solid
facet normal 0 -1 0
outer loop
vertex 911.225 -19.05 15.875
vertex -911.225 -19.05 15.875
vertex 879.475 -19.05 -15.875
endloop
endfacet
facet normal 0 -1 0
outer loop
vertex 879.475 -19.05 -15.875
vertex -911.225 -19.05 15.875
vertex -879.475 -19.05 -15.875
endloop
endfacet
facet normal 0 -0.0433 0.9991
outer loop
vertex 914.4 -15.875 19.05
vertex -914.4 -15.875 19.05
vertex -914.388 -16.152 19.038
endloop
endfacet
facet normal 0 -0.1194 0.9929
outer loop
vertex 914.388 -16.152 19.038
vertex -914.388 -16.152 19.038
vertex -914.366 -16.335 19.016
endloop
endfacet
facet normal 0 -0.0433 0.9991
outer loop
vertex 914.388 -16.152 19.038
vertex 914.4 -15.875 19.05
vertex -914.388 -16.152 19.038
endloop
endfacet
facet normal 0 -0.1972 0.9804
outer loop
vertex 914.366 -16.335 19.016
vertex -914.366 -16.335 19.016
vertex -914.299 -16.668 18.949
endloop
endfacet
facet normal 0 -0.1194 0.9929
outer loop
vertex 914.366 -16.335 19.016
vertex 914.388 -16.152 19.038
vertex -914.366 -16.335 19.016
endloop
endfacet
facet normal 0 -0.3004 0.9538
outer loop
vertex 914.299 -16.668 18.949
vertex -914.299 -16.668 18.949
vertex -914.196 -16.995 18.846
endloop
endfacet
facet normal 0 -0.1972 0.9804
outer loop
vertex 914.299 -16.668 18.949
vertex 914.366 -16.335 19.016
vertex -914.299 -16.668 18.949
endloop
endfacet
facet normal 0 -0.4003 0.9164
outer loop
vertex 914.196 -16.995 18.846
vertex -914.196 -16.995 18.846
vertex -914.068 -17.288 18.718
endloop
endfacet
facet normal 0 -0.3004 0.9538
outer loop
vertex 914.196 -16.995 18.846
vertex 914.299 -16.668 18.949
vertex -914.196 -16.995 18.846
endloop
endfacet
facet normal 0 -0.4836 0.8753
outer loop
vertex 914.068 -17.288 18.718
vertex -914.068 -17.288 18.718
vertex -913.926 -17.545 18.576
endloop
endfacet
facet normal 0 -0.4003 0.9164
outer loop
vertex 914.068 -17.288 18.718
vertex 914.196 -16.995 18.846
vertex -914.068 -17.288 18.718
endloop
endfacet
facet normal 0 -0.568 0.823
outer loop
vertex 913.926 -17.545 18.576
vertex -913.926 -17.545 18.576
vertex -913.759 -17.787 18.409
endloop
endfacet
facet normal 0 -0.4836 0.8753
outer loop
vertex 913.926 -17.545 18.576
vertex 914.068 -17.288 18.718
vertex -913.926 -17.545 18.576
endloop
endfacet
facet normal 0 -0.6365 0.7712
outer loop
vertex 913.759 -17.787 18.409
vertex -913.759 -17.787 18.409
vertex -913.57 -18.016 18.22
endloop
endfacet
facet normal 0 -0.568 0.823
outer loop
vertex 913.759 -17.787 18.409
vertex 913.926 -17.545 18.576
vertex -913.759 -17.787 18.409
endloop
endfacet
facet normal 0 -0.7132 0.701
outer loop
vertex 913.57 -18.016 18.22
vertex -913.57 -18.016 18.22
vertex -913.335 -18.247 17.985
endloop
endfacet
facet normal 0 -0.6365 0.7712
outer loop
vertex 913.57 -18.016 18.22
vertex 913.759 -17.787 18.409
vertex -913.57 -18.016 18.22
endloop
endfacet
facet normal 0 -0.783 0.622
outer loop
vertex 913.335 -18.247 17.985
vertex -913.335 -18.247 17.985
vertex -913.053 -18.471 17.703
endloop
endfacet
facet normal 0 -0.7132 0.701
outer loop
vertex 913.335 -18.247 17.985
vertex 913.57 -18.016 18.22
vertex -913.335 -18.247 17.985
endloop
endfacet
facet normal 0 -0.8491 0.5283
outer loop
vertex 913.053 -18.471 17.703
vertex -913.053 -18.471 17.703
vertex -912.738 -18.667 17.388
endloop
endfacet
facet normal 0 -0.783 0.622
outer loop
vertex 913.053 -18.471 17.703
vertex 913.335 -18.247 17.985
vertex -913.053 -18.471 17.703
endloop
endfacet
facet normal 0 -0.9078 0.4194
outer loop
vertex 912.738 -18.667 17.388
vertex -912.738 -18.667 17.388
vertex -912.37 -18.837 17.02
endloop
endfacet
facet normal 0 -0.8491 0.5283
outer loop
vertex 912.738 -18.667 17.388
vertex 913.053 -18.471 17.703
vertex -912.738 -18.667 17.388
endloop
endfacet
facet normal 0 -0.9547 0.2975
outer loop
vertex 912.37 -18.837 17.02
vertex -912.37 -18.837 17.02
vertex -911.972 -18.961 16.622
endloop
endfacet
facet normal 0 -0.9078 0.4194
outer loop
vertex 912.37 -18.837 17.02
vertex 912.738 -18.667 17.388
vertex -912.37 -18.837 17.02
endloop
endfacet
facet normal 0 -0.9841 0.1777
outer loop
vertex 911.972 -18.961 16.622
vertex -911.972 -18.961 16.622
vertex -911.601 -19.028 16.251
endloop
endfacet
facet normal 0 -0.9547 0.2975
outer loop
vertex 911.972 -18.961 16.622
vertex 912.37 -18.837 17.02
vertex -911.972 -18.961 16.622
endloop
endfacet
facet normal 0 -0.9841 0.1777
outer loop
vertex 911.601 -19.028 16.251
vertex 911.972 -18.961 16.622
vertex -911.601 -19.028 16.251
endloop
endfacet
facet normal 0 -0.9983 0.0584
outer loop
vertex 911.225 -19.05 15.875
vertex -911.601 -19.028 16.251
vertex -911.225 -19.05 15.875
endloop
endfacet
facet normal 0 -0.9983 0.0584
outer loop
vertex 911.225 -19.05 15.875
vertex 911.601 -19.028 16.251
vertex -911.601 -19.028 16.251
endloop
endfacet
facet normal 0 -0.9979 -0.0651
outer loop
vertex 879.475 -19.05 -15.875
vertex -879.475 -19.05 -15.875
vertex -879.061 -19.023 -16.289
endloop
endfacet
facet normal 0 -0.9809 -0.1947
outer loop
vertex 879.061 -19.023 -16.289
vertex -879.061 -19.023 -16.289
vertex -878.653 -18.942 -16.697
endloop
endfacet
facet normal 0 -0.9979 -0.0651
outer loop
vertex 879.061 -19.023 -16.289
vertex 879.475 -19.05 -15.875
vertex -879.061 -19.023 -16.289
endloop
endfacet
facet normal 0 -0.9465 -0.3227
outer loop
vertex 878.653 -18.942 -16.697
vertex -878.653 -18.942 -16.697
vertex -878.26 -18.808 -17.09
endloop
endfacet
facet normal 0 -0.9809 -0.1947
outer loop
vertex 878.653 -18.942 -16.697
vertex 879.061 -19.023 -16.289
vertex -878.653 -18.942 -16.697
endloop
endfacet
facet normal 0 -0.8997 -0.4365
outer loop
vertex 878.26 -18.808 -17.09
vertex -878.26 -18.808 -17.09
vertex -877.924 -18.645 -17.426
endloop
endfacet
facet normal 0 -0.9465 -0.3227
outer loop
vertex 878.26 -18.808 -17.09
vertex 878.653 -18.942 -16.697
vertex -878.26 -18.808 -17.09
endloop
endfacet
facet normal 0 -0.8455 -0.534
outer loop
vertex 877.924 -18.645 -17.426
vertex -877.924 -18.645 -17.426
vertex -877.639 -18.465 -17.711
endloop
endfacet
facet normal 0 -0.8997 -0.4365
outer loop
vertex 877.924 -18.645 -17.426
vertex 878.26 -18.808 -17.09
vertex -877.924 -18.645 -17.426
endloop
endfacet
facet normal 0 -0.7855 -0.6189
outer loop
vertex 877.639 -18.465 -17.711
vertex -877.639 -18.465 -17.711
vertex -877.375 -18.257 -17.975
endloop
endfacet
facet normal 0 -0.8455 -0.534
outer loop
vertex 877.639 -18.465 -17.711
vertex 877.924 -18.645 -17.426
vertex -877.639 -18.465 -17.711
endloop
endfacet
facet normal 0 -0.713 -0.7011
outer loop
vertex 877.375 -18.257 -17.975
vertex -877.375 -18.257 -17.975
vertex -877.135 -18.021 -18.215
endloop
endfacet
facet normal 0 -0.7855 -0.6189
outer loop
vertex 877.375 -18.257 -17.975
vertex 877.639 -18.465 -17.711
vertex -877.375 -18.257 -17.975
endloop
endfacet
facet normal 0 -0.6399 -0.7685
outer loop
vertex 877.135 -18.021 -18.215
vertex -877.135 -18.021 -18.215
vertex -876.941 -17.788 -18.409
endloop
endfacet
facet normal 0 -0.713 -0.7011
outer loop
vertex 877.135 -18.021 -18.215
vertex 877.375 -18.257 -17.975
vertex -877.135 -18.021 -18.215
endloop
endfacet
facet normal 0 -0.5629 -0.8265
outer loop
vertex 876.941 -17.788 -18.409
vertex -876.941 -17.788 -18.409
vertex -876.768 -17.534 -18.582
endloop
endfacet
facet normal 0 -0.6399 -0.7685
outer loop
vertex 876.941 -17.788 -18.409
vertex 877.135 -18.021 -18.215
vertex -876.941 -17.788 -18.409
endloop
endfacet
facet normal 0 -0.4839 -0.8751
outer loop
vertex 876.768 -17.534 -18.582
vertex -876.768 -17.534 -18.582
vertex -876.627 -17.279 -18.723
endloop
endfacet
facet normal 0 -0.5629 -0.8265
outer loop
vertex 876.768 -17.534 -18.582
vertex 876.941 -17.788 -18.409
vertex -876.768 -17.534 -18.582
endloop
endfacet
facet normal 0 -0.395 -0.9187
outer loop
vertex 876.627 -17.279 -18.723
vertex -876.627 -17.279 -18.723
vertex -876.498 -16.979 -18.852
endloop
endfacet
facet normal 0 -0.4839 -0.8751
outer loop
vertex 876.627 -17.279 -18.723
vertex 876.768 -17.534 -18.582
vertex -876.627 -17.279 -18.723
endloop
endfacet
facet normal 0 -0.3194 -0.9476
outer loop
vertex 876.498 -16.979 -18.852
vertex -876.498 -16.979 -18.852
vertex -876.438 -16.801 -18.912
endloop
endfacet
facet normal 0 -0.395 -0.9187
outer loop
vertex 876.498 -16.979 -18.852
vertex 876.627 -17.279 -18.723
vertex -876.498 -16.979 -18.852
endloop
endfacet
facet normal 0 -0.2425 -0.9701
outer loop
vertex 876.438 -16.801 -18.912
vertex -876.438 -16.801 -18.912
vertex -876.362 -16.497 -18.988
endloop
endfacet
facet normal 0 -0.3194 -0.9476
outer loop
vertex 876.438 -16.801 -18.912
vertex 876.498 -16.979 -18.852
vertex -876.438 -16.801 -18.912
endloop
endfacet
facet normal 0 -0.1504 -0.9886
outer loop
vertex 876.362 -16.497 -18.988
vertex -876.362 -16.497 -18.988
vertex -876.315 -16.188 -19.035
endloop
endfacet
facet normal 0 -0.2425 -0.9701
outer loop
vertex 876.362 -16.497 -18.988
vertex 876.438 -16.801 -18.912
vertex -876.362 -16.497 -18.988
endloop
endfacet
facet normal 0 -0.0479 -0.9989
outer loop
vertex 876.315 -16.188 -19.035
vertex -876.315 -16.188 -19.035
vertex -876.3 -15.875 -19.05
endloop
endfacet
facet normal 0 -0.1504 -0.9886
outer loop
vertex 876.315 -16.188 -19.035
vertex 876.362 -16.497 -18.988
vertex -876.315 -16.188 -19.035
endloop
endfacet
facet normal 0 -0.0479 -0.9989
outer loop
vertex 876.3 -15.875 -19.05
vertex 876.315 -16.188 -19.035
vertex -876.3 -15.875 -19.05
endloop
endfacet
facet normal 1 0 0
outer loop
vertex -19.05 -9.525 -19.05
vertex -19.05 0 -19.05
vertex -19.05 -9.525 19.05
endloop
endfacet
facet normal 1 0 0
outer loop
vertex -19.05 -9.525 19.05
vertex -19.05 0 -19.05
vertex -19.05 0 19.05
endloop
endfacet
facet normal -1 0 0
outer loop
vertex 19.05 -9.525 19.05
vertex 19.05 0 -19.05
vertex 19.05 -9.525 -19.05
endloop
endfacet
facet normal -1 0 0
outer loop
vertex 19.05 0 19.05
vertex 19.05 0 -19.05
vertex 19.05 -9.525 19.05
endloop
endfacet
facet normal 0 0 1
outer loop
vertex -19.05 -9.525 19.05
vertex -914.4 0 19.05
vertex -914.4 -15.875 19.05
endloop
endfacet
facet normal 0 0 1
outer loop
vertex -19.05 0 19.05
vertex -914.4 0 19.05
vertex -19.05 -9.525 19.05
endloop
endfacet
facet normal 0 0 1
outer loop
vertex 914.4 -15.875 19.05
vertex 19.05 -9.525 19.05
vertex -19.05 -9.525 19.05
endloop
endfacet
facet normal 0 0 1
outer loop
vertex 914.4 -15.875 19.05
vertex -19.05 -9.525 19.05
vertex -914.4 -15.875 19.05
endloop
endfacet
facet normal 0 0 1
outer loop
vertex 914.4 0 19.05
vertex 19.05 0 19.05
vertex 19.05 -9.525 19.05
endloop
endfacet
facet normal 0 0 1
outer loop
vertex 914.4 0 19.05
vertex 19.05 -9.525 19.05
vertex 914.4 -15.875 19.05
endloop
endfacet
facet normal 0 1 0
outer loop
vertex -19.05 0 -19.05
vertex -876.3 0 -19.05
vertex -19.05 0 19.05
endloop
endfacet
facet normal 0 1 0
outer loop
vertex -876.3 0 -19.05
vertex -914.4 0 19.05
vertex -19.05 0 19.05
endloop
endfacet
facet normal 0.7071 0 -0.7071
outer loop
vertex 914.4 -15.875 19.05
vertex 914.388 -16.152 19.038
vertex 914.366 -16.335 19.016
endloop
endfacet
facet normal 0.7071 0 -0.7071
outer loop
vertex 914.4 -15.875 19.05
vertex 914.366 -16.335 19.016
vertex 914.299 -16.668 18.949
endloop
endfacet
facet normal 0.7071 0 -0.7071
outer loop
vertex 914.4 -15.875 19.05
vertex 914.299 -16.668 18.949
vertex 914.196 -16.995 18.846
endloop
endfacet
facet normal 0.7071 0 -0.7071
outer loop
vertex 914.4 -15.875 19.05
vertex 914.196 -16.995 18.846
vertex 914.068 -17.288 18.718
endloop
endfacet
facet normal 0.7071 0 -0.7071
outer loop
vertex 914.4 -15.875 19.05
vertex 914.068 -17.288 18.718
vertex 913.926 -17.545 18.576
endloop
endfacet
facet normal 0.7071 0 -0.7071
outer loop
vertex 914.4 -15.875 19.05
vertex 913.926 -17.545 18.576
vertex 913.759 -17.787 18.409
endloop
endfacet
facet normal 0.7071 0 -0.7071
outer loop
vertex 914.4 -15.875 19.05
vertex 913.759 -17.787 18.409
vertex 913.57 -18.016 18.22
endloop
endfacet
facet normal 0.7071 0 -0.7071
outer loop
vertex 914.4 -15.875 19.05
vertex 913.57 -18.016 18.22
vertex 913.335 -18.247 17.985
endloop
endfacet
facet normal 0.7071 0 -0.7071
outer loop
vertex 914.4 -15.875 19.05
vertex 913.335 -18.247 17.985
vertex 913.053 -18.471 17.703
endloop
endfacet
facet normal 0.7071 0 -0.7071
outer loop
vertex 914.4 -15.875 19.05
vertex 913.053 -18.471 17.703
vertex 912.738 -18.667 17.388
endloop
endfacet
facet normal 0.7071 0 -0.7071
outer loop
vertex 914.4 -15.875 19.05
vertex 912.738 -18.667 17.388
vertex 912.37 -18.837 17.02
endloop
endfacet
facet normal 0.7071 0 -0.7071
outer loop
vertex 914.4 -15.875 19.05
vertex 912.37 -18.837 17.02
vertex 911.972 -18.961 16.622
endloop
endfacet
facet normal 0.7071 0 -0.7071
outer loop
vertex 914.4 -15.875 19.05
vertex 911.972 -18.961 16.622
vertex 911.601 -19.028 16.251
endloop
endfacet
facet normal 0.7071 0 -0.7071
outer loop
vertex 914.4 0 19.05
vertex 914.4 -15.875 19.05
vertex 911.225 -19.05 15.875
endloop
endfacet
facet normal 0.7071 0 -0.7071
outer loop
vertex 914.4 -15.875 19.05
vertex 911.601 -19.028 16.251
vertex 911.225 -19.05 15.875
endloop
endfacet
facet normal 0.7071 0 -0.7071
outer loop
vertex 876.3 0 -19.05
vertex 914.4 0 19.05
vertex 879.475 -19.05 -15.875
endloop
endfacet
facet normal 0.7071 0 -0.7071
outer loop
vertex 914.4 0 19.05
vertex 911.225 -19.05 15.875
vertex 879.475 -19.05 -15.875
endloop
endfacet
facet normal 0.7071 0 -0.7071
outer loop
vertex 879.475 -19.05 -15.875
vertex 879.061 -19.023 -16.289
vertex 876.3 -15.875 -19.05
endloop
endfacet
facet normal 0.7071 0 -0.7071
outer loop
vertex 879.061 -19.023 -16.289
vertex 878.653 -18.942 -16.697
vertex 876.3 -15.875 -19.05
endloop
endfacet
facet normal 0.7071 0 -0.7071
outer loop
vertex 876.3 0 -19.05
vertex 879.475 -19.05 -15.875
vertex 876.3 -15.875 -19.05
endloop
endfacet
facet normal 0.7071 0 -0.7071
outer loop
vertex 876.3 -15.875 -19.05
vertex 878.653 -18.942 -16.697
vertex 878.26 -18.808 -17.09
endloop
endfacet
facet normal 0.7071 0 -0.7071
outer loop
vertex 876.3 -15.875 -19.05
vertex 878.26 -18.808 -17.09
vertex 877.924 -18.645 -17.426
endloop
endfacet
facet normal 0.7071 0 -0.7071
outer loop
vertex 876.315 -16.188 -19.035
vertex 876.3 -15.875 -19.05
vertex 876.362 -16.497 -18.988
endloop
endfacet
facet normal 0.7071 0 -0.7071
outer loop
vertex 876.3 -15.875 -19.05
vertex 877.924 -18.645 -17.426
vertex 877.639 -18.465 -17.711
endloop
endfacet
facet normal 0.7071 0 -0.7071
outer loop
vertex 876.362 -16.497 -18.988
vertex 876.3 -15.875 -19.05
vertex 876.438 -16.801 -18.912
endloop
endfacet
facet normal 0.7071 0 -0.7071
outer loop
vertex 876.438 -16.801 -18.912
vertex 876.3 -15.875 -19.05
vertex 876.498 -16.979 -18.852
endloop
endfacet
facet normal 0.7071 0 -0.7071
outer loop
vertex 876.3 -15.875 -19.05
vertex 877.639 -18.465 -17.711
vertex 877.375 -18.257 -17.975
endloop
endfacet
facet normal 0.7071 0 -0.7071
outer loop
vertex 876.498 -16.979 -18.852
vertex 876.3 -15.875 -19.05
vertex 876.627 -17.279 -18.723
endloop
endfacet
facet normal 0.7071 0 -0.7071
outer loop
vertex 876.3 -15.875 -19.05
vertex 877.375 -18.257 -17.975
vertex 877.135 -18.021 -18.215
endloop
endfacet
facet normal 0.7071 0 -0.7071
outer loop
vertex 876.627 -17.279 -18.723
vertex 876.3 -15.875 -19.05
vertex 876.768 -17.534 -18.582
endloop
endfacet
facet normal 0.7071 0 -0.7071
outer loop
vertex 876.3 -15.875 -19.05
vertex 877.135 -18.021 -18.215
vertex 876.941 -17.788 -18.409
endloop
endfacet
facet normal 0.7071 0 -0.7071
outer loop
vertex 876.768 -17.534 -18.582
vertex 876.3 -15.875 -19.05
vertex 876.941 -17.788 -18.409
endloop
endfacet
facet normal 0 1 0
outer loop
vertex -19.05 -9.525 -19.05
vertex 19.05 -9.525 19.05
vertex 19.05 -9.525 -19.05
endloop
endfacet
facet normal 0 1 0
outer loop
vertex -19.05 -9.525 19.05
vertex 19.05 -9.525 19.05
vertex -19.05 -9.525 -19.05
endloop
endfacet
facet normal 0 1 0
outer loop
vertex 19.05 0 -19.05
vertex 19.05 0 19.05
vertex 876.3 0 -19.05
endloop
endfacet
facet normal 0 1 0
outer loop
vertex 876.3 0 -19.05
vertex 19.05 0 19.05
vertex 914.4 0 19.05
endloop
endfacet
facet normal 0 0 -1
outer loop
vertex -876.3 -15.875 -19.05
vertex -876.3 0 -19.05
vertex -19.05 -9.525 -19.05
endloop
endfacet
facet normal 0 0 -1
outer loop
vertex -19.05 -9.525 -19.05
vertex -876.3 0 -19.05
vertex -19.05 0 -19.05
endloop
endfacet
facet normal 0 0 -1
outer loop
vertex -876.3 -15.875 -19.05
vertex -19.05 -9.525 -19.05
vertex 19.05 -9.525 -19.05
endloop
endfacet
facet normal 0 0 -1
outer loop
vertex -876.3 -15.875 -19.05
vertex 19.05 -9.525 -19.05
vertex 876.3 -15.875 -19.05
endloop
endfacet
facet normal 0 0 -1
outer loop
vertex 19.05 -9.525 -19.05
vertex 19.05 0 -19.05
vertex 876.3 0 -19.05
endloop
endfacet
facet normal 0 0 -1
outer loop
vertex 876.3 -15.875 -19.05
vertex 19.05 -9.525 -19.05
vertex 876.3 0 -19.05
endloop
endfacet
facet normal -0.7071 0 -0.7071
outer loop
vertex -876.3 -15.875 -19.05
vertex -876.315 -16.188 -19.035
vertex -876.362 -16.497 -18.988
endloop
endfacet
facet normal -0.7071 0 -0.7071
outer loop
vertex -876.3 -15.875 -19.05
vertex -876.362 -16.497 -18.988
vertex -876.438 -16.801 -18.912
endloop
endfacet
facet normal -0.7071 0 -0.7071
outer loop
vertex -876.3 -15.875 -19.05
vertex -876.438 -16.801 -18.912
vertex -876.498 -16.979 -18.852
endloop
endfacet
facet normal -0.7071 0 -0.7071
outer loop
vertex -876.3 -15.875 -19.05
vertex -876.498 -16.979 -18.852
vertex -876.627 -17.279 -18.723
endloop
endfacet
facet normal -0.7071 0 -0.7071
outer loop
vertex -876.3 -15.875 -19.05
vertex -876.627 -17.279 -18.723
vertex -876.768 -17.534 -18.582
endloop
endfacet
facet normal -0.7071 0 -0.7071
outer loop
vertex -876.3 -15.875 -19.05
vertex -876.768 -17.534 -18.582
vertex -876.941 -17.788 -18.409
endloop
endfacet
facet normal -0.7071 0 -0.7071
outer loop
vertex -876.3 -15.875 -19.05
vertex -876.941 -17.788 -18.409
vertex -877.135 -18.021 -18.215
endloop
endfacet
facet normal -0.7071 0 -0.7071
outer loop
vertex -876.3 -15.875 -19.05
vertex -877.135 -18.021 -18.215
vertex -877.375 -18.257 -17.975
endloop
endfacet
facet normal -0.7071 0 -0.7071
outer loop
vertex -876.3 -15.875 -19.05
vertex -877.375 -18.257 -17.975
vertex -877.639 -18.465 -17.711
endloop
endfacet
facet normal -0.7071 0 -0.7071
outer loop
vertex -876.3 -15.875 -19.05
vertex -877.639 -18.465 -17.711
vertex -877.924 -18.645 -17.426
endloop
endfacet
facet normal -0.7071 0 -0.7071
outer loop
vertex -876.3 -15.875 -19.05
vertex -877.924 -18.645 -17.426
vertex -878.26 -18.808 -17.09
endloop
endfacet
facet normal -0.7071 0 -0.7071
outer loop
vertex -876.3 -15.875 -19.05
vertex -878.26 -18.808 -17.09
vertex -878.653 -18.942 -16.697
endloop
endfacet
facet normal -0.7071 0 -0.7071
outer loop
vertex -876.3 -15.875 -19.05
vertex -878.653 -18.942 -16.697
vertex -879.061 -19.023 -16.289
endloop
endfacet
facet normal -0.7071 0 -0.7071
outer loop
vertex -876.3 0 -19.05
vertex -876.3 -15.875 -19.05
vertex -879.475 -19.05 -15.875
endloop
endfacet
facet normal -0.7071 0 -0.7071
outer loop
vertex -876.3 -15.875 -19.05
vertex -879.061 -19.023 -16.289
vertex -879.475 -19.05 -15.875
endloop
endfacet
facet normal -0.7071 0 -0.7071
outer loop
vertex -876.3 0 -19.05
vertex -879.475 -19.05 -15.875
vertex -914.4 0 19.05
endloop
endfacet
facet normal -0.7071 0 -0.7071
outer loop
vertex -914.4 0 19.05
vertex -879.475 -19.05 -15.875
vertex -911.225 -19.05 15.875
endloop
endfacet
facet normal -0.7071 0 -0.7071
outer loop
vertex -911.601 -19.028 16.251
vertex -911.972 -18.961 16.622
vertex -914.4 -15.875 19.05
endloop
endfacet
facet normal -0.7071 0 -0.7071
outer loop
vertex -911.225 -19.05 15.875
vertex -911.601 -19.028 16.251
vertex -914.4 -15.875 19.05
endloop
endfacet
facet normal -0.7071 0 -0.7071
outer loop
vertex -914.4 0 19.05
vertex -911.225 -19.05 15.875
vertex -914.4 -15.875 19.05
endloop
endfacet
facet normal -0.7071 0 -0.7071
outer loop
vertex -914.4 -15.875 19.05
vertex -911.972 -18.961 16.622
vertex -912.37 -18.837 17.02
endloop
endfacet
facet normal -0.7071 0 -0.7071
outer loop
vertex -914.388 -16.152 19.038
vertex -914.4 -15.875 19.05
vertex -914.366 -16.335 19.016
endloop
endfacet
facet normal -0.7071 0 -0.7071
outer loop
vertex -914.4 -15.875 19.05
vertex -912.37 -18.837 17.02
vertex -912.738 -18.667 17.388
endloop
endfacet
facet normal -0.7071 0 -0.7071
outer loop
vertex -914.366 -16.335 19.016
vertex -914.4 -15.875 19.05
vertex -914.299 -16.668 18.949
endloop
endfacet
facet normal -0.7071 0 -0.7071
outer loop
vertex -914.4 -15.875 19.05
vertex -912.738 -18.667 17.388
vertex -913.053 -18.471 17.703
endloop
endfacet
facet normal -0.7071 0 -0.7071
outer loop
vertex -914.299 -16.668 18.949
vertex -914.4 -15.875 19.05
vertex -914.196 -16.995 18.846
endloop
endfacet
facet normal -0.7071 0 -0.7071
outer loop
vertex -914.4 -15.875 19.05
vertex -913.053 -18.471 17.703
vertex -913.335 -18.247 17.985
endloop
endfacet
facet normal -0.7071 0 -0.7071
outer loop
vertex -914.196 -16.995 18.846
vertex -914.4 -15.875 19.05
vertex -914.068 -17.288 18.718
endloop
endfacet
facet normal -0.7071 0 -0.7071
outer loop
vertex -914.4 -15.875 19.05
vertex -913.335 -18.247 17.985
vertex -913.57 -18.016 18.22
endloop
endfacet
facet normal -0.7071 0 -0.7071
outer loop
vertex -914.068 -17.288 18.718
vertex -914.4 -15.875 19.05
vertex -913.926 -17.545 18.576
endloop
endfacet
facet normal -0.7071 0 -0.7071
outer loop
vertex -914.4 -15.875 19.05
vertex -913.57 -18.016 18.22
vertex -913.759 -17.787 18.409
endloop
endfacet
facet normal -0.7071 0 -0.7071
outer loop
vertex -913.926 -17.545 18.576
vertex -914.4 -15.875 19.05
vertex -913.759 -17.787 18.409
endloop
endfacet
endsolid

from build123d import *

# Parameters (mm, degrees)
F0_W     = 1828.8
F0_H     = 38.1
F1_DEPTH = 19.05
F2_W     = 38.1
F2_H     = 38.1
F3_DEPTH = 9.525
F5_DEPTH = 19.051
F6_R     = 3.175


with BuildPart() as f1:
    # F0 (on Front) → F1 (new body)
    with BuildSketch(Plane.XZ):
        Rectangle(F0_W, F0_H)
    extrude(amount=F1_DEPTH)

    # F2 (on face) → F3 (cut)
    with BuildSketch(Plane(origin=(0, 0, 0), x_dir=(-1, 0, 0), z_dir=(0, 1, 0))):
        Rectangle(F2_W, F2_H)
    extrude(amount=-F3_DEPTH, mode=Mode.SUBTRACT)

    # F4 (on face) → F5 (cut, through all)
    with BuildSketch(Plane.XZ.offset(19.05)):
        Polygon((-876.3, -19.05), (-914.4, 19.05), (-914.4, -19.05), align=None)
        Polygon((876.3, -19.05), (914.4, -19.05), (914.4, 19.05), align=None)
    extrude(amount=-F5_DEPTH, mode=Mode.SUBTRACT)

    # F6
    f6_edges = [f1.edges().sort_by_distance(p)[0] for p in [
        (0, -19.05, 19.05),
        (0, -19.05, -19.05),
    ]]
    fillet(f6_edges, radius=F6_R)


solid = f1.part
